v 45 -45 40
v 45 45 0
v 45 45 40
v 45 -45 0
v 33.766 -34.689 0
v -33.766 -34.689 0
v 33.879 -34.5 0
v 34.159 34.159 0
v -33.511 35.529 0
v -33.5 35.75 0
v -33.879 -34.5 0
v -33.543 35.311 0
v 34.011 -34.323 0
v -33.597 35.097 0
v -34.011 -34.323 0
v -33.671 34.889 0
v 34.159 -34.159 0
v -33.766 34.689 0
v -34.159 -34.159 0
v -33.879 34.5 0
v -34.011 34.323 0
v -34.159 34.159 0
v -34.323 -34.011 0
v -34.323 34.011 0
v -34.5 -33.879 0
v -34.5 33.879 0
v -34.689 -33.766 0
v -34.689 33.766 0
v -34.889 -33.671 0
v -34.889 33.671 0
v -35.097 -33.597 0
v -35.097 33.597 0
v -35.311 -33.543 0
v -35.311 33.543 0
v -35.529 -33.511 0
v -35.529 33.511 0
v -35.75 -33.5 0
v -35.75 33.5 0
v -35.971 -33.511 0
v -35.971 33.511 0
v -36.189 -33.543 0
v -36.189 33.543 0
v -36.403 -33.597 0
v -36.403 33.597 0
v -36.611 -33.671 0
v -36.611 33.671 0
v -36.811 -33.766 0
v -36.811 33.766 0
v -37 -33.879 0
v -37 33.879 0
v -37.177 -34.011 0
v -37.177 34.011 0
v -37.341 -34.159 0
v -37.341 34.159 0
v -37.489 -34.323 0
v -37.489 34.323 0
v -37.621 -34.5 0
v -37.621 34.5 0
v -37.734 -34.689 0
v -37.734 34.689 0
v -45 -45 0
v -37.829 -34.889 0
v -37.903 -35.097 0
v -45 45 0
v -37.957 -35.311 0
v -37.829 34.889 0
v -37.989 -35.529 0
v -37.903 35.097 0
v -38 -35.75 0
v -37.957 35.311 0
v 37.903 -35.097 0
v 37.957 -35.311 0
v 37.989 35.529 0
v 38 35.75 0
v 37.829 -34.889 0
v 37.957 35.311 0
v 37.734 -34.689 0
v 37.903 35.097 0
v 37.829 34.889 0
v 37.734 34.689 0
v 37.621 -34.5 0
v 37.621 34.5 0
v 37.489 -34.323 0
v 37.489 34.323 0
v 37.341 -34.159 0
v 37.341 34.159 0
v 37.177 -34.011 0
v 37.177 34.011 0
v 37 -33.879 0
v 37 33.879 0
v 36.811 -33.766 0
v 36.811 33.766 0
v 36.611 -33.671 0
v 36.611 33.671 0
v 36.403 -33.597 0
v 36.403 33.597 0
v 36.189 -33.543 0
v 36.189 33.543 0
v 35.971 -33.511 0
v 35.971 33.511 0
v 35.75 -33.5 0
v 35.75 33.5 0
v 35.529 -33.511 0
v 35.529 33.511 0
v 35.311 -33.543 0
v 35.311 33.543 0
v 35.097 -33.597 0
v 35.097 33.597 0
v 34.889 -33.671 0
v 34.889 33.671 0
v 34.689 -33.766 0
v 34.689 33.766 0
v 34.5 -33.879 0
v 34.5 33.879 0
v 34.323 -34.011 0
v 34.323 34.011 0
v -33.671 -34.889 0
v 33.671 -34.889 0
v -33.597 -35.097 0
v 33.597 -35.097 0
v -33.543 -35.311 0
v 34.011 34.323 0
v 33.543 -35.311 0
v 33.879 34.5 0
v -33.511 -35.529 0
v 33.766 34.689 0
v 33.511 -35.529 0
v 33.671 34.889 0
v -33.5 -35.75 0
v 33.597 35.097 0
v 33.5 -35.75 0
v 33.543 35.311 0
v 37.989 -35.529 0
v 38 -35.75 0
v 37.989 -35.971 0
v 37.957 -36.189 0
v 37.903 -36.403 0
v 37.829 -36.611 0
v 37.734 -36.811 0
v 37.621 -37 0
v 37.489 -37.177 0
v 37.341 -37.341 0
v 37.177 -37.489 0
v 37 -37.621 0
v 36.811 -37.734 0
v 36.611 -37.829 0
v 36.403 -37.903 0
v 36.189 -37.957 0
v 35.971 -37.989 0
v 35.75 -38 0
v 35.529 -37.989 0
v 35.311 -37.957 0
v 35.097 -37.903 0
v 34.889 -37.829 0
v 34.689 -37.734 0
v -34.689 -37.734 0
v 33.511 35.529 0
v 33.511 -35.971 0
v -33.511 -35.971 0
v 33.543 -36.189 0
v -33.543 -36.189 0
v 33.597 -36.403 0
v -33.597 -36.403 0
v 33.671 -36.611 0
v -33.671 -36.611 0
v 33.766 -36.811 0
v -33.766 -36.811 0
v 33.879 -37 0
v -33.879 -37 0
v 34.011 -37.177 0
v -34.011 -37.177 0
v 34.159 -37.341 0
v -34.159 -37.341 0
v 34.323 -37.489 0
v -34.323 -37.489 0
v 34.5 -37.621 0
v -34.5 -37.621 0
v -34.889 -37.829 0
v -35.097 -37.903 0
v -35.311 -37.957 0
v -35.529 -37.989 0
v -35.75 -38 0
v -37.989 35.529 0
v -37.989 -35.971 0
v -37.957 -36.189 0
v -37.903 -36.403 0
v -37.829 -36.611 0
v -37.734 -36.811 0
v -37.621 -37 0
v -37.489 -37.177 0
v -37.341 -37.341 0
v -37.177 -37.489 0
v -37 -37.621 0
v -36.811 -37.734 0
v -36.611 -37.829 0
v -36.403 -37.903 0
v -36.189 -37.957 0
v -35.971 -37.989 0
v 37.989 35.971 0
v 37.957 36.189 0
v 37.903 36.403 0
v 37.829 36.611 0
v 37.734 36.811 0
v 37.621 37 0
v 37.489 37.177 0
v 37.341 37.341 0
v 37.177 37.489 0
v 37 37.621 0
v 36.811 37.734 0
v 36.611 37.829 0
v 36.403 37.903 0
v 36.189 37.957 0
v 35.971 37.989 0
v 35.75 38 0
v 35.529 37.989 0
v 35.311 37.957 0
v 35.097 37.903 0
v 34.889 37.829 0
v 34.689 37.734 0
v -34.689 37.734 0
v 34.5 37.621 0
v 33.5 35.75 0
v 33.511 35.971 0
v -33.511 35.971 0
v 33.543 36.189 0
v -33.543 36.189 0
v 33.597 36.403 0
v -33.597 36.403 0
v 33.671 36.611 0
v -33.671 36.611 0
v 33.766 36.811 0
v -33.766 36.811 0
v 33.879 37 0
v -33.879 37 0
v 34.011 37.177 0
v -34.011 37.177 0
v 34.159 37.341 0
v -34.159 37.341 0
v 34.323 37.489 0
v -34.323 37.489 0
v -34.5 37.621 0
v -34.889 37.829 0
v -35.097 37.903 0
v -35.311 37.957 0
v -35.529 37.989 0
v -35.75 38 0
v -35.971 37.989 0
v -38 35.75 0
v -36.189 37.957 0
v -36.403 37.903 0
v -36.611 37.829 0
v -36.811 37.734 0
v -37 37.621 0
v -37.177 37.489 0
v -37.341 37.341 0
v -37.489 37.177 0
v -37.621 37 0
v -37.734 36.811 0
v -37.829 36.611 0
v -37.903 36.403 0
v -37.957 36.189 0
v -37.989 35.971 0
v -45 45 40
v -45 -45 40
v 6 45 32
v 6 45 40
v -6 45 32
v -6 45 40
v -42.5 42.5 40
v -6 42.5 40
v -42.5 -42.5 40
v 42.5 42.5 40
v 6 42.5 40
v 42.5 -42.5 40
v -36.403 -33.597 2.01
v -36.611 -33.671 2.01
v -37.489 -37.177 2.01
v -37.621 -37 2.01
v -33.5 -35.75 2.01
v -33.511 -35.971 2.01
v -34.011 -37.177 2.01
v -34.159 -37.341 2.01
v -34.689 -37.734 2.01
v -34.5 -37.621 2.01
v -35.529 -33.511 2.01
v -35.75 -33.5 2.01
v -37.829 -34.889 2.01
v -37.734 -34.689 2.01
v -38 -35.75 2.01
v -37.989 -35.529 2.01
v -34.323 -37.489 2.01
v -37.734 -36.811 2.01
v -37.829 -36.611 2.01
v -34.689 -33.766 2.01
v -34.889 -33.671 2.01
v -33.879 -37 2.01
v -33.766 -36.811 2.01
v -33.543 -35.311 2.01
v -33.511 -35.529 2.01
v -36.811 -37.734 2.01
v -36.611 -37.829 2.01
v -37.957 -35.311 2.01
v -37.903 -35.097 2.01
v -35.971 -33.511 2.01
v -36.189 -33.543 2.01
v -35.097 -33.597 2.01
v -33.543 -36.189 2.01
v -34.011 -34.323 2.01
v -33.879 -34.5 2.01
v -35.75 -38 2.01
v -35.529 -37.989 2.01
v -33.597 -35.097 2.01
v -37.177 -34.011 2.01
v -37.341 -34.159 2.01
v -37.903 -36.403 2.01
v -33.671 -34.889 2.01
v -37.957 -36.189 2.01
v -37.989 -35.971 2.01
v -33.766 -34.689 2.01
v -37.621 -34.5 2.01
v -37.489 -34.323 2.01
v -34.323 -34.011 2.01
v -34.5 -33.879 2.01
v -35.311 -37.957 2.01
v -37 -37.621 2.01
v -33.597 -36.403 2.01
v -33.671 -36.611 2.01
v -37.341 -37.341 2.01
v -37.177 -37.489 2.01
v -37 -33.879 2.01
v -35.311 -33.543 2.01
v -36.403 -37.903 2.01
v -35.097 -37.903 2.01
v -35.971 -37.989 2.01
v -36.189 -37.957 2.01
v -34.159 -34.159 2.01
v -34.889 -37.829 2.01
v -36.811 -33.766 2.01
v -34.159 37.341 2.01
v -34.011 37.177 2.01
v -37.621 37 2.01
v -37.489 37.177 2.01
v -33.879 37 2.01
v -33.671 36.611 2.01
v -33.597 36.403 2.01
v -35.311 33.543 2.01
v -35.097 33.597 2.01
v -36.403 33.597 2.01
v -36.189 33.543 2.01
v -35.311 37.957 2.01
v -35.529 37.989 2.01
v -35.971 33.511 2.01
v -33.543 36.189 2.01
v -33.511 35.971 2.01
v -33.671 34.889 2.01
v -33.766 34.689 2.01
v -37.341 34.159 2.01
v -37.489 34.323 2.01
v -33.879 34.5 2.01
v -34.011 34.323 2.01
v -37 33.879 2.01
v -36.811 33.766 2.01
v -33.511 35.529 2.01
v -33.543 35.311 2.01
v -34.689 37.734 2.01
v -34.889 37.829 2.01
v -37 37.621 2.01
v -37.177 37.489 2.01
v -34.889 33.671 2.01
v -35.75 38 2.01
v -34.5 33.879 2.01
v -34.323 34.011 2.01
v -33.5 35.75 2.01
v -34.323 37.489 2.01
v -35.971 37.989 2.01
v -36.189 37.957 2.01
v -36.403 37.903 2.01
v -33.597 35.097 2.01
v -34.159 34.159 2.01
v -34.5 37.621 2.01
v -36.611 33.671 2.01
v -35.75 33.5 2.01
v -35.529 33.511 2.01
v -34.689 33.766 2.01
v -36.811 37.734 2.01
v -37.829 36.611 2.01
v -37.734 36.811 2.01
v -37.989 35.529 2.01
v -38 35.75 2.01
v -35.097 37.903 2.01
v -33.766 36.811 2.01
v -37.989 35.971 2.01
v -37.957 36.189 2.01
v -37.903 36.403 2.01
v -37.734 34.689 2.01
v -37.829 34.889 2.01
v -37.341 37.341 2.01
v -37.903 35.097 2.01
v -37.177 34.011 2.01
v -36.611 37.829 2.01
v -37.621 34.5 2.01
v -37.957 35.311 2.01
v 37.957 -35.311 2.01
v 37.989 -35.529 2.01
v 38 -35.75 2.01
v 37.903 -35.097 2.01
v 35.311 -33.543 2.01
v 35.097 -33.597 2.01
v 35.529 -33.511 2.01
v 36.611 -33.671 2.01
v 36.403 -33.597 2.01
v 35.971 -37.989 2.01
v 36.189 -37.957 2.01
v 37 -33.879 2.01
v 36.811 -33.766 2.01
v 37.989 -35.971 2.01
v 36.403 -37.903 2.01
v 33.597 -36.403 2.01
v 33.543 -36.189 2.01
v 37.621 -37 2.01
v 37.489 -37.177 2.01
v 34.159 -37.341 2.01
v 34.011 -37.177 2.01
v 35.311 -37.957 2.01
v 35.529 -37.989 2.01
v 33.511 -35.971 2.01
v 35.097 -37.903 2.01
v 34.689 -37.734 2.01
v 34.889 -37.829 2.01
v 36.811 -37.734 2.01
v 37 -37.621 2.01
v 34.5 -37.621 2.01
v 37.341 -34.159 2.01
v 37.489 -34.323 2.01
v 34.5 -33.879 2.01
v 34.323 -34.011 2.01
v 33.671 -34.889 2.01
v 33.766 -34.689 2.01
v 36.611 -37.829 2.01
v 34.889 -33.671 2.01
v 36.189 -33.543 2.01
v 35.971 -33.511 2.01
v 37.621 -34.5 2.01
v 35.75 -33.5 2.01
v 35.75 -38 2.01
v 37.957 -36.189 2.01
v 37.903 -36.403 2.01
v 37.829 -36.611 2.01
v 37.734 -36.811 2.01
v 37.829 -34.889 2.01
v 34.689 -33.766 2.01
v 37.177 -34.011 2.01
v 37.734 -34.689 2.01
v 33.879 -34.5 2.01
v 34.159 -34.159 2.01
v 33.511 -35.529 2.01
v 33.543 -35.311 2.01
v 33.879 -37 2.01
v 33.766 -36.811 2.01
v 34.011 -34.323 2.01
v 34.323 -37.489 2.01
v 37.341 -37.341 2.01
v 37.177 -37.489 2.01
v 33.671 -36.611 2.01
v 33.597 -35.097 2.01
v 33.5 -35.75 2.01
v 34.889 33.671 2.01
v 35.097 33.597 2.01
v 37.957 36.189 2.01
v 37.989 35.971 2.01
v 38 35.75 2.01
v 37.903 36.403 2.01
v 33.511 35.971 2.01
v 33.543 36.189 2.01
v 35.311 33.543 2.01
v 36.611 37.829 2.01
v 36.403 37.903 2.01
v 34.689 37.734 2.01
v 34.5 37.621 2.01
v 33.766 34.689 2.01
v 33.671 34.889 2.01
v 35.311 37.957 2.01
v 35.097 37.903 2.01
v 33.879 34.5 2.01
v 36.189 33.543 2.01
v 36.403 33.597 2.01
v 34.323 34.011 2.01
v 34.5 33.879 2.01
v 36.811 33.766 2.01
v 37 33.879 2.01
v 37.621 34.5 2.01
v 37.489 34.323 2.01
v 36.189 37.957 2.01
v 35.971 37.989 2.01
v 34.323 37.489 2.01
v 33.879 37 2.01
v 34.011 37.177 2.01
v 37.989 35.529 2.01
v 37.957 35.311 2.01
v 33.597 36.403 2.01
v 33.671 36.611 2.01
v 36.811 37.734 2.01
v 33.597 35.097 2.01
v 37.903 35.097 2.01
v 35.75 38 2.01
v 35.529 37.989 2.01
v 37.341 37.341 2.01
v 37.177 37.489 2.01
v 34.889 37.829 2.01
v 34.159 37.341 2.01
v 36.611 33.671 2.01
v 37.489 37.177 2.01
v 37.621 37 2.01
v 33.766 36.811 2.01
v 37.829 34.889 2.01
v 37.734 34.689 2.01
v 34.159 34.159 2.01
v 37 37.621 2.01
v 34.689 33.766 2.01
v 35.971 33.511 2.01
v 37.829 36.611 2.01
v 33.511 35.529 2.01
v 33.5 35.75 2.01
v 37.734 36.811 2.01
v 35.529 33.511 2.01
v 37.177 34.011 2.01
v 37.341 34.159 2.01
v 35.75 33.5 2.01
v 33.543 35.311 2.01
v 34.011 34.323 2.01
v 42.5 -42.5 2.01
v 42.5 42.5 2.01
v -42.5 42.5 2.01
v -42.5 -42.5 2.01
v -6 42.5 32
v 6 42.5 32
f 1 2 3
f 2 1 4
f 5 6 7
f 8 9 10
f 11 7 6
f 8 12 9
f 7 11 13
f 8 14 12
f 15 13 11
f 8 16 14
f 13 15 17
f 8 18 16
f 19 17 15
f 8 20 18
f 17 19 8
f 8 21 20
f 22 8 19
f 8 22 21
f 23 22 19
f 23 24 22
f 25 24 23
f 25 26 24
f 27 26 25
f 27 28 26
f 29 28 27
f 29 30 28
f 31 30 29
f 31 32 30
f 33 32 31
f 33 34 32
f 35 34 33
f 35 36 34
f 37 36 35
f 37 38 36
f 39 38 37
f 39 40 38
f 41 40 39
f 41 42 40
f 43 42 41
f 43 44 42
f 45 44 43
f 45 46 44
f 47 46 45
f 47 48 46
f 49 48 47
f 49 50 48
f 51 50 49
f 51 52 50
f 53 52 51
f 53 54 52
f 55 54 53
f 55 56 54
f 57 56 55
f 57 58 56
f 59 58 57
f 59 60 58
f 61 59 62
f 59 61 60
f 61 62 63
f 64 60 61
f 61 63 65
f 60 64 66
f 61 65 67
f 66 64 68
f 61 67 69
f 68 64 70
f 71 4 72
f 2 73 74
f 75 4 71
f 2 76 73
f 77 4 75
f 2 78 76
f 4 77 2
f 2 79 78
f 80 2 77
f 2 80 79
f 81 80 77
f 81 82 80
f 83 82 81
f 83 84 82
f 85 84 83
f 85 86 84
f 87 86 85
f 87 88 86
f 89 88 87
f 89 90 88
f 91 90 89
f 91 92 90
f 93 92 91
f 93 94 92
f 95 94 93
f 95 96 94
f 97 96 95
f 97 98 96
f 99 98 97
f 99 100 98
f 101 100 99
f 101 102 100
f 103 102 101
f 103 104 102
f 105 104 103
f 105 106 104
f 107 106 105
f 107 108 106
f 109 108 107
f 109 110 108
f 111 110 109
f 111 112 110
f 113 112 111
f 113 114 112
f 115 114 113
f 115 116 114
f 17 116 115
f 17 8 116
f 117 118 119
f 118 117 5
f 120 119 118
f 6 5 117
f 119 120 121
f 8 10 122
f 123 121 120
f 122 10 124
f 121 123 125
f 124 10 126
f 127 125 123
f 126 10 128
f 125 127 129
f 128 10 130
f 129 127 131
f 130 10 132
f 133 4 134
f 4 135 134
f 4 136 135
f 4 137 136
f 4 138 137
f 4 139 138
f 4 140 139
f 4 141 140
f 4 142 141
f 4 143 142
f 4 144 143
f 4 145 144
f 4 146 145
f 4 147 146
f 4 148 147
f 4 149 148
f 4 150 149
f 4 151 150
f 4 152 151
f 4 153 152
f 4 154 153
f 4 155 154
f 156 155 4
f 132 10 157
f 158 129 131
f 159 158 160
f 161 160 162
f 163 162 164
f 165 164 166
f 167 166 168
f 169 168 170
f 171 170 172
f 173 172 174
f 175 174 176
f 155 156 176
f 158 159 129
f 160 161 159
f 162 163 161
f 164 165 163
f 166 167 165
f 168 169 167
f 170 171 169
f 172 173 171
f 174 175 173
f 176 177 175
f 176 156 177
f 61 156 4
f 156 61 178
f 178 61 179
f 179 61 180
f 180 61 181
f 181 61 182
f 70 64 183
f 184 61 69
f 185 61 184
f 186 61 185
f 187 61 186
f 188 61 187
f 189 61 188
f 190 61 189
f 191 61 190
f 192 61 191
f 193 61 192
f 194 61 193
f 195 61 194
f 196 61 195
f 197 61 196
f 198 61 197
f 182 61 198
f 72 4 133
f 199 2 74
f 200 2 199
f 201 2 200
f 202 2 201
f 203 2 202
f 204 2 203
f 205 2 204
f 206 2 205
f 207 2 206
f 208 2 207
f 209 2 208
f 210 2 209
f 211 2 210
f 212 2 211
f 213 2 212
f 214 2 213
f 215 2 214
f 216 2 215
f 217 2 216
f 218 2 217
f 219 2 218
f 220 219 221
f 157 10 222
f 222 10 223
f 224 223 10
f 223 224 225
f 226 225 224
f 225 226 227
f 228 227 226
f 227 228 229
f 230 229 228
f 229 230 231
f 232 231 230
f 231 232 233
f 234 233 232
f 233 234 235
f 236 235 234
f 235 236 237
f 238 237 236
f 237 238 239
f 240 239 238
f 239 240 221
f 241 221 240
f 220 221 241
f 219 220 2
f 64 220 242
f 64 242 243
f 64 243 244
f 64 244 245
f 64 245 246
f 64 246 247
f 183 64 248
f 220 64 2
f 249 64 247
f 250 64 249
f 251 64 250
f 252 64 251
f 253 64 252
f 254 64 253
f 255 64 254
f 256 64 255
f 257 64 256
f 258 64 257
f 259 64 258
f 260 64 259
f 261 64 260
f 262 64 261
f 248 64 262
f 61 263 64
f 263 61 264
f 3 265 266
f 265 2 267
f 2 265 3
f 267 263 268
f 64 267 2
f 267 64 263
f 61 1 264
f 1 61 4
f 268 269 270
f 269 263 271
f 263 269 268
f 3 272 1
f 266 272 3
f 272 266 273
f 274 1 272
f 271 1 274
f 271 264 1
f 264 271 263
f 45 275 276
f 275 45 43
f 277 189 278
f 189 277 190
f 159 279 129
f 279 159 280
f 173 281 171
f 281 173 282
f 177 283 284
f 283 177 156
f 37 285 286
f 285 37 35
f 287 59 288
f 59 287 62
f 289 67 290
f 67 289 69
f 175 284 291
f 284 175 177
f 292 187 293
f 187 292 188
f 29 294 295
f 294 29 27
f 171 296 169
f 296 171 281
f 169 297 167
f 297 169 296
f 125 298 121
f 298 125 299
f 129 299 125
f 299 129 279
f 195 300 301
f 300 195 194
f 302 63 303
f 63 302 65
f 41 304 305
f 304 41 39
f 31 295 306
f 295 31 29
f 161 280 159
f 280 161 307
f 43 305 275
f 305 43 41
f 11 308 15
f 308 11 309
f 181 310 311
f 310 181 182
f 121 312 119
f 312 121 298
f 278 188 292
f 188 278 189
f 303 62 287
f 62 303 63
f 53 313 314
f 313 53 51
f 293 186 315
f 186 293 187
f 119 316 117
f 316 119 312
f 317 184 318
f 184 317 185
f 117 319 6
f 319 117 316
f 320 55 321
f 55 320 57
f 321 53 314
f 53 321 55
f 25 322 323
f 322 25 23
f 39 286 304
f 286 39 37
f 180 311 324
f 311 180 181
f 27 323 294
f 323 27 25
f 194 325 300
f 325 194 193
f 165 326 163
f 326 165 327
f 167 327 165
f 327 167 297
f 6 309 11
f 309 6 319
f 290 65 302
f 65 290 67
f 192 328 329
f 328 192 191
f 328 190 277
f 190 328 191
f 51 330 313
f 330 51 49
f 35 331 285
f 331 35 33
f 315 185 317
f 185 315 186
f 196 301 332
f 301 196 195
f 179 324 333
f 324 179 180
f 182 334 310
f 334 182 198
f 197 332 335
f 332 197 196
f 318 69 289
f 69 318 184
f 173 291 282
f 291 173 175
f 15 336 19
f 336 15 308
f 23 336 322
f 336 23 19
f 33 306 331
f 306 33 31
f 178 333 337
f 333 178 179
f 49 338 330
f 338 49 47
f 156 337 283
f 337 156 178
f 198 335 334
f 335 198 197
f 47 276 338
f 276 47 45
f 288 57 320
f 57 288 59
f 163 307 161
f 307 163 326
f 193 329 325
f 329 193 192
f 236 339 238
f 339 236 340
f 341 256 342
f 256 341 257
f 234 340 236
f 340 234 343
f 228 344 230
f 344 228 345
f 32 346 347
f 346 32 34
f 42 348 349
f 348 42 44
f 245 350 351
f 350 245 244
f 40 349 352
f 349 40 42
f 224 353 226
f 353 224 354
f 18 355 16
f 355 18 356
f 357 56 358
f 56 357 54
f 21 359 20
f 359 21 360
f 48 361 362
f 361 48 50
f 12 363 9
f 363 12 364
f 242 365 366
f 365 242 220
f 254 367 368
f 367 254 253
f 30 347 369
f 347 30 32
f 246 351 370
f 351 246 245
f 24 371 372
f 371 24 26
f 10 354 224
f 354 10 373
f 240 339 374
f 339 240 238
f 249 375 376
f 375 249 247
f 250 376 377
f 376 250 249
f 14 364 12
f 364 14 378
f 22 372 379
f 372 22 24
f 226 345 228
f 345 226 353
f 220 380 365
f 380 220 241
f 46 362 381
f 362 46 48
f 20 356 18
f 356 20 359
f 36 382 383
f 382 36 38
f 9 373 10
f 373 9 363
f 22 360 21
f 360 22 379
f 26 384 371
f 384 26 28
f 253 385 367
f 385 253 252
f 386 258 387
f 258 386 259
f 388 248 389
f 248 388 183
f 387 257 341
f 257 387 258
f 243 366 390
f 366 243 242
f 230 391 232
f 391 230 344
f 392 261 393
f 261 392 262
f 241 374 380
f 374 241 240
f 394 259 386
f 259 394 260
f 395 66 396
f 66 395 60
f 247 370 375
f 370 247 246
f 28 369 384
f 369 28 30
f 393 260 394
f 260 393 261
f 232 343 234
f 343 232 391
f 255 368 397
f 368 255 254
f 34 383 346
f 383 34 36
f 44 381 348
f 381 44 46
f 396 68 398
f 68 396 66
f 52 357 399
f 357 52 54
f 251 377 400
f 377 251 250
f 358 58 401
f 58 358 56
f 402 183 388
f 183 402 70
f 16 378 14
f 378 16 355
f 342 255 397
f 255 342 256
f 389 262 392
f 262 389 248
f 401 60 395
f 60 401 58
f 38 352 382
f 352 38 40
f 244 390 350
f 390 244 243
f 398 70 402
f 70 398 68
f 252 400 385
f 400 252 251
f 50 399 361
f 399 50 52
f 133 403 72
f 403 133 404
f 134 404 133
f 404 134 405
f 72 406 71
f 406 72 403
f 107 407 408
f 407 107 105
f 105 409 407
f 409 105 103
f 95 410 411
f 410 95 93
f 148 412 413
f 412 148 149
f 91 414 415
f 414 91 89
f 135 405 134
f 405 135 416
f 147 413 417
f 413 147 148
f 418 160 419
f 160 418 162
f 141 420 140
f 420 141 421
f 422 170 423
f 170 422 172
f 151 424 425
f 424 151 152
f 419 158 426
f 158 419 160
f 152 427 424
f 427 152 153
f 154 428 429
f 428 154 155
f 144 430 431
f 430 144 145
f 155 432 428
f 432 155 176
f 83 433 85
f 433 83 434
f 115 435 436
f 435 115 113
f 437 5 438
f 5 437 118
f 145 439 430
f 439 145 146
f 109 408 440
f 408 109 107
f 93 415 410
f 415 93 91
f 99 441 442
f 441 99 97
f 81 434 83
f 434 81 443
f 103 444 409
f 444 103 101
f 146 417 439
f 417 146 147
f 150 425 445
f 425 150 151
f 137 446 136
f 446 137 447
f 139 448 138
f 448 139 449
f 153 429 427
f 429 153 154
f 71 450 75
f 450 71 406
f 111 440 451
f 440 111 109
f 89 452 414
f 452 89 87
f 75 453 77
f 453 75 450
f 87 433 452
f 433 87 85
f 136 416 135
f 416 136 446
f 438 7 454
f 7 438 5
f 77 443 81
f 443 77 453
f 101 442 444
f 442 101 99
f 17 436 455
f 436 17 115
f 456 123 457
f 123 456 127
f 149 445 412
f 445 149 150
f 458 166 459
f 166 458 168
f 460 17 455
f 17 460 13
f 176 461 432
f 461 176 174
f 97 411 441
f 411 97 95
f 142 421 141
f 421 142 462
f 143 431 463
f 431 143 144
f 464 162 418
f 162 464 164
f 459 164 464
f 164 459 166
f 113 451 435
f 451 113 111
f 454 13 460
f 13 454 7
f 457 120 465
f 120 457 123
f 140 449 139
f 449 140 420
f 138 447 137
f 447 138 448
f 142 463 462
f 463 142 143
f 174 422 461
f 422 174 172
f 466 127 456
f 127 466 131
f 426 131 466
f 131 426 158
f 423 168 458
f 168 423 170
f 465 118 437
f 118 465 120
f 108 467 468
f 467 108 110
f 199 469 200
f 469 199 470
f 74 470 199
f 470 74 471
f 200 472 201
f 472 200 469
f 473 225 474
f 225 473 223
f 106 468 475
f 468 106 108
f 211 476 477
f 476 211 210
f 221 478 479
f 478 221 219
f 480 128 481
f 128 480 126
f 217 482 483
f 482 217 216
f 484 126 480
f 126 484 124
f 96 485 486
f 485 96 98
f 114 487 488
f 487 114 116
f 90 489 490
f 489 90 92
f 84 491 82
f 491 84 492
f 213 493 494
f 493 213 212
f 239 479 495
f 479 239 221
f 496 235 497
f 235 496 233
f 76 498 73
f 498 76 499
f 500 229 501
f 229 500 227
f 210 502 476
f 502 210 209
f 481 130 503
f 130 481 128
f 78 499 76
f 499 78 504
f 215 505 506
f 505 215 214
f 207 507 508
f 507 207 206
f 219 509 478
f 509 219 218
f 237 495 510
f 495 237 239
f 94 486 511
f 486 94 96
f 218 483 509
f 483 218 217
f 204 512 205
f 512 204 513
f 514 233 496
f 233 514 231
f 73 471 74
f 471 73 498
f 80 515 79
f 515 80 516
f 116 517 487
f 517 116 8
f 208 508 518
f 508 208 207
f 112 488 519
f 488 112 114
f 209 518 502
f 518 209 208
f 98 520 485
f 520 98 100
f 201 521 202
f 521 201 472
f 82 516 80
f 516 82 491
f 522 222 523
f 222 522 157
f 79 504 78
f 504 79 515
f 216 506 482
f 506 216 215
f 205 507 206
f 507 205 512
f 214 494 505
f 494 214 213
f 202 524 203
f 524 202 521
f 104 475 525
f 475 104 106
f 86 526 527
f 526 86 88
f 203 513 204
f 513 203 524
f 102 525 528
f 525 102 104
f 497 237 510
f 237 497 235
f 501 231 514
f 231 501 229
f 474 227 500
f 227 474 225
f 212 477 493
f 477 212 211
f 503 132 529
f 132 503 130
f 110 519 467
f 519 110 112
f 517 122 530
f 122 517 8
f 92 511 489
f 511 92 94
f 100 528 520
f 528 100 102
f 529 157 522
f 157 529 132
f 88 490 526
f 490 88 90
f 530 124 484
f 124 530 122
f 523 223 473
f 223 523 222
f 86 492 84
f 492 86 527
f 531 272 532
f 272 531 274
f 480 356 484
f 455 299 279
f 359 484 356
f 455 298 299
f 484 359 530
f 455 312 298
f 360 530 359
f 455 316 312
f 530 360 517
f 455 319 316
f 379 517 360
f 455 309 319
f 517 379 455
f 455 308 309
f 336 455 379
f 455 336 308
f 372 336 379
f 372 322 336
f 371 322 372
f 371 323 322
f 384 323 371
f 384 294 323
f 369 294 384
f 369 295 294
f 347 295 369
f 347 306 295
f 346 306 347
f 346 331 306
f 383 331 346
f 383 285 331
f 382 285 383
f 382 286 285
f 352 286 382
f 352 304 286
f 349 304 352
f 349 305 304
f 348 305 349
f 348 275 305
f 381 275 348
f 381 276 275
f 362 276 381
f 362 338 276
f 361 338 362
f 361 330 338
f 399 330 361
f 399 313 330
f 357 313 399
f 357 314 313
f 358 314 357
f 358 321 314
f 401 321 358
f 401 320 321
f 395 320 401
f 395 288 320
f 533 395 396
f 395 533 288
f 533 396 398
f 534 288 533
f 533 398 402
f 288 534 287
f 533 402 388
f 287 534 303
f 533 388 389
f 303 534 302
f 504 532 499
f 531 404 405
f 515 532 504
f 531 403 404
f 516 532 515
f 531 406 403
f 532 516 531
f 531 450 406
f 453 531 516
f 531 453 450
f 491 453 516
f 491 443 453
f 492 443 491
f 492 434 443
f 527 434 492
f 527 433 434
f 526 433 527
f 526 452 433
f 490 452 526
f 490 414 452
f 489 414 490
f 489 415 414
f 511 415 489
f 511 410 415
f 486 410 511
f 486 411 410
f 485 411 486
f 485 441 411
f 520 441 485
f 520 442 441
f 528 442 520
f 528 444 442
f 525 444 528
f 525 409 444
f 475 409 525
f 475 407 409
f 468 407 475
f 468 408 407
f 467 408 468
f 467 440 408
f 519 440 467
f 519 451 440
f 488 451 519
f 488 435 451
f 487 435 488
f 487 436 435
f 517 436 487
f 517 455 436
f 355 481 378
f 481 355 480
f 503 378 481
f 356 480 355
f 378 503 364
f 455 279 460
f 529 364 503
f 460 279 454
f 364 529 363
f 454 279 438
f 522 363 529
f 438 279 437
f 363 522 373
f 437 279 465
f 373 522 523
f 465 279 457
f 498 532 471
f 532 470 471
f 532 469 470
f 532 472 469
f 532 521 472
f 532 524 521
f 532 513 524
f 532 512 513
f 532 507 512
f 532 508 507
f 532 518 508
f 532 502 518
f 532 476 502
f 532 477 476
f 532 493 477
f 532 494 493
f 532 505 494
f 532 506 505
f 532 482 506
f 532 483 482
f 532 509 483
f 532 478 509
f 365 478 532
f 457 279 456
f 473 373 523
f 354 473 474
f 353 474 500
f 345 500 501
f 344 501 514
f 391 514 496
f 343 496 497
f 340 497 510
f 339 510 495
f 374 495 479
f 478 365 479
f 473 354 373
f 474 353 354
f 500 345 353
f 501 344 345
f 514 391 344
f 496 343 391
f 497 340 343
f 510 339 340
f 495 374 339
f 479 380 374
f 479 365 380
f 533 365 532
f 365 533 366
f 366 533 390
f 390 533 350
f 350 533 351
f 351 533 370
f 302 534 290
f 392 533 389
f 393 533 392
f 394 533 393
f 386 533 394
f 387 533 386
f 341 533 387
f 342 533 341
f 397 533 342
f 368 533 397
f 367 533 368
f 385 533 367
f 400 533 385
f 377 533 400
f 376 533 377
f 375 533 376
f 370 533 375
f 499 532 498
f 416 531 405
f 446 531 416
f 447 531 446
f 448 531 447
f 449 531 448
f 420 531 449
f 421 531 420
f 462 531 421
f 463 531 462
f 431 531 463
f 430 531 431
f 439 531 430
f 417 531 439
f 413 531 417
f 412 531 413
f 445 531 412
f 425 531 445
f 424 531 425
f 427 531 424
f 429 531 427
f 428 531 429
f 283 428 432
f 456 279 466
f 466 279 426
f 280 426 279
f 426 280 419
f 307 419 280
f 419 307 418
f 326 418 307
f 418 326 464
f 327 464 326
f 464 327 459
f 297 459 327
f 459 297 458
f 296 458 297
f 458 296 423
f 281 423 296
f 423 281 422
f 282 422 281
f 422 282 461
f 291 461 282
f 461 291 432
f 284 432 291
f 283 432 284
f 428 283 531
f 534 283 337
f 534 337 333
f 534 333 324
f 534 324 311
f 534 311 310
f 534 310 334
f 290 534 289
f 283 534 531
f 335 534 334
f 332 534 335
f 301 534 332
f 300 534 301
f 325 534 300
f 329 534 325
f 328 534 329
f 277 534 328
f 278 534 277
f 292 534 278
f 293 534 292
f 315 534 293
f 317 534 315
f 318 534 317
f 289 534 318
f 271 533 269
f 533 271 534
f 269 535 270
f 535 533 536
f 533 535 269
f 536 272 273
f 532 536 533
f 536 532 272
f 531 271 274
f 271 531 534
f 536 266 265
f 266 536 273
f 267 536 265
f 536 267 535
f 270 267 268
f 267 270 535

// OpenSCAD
// DIY Magnetic Stirrer Housing for 80mm Fan
// Printed upside-down: Top plate sits on the bed (Z=0)

// --- Dimensions ---
outer_size = 90.0;    // Outer width and length (mm)
top_thick  = 2.0;     // Thickness of the top plate (mm)
wall_thick = 2.5;     // Thickness of the four walls (mm)
total_h    = 40.0;    // Total height of the box (mm)
hole_dia   = 4.5;     // Diameter for M4 screw holes (mm)
hole_pat   = 71.5;    // Square pattern for fan mounting holes (mm)
notch_w    = 12.0;    // Width of the cable notch (mm)
notch_d    = 8.0;     // Depth of the notch from the open edge (mm)

$fn = 64;

// --- Modeling ---

// The part is modeled upside-down as requested.
// The top plate is at Z = [0, top_thick]
// The walls rise from Z = top_thick to Z = total_h

difference() {
    // Main Body: The solid block representing the walls and top plate
    union() {
        // The top plate
        translate([-outer_size/2, -outer_size/2, 0])
            cube([outer_size, outer_size, top_thick]);
        
        // The four walls
        translate([-outer_size/2, -outer_size/2, top_thick])
            cube([outer_size, outer_size, total_h - top_thick]);
    }

    // 1. Hollow out the inside to create the box cavity
    // We subtract a smaller cube from the center
    translate([-(outer_size - 2*wall_thick)/2, -(outer_size - 2*wall_thick)/2, top_thick + 0.01])
        cube([outer_size - 2*wall_thick, outer_size - 2*wall_thick, total_h]);

    // 2. Drill the four M4 screw holes through the top plate
    for (sx = [-1, 1], sy = [-1, 1]) {
        translate([sx * hole_pat/2, sy * hole_pat/2, -1])
            cylinder(h = top_thick + 2, d = hole_dia);
    }

    // 3. Cable notch in one wall
    // The notch is centered along one wall, reaching 8mm down from the open edge (Z=40).
    // So the notch exists from Z = (40 - 8) = 32 to Z = 40.
    // Since we are subtracting from the solid, we place it on the wall.
    // We'll place it on the wall located at Y = outer_size/2.
    translate([-notch_w/2, outer_size/2 - wall_thick, total_h - notch_d])
        cube([notch_w, wall_thick + 1, notch_d + 0.01]);
}
